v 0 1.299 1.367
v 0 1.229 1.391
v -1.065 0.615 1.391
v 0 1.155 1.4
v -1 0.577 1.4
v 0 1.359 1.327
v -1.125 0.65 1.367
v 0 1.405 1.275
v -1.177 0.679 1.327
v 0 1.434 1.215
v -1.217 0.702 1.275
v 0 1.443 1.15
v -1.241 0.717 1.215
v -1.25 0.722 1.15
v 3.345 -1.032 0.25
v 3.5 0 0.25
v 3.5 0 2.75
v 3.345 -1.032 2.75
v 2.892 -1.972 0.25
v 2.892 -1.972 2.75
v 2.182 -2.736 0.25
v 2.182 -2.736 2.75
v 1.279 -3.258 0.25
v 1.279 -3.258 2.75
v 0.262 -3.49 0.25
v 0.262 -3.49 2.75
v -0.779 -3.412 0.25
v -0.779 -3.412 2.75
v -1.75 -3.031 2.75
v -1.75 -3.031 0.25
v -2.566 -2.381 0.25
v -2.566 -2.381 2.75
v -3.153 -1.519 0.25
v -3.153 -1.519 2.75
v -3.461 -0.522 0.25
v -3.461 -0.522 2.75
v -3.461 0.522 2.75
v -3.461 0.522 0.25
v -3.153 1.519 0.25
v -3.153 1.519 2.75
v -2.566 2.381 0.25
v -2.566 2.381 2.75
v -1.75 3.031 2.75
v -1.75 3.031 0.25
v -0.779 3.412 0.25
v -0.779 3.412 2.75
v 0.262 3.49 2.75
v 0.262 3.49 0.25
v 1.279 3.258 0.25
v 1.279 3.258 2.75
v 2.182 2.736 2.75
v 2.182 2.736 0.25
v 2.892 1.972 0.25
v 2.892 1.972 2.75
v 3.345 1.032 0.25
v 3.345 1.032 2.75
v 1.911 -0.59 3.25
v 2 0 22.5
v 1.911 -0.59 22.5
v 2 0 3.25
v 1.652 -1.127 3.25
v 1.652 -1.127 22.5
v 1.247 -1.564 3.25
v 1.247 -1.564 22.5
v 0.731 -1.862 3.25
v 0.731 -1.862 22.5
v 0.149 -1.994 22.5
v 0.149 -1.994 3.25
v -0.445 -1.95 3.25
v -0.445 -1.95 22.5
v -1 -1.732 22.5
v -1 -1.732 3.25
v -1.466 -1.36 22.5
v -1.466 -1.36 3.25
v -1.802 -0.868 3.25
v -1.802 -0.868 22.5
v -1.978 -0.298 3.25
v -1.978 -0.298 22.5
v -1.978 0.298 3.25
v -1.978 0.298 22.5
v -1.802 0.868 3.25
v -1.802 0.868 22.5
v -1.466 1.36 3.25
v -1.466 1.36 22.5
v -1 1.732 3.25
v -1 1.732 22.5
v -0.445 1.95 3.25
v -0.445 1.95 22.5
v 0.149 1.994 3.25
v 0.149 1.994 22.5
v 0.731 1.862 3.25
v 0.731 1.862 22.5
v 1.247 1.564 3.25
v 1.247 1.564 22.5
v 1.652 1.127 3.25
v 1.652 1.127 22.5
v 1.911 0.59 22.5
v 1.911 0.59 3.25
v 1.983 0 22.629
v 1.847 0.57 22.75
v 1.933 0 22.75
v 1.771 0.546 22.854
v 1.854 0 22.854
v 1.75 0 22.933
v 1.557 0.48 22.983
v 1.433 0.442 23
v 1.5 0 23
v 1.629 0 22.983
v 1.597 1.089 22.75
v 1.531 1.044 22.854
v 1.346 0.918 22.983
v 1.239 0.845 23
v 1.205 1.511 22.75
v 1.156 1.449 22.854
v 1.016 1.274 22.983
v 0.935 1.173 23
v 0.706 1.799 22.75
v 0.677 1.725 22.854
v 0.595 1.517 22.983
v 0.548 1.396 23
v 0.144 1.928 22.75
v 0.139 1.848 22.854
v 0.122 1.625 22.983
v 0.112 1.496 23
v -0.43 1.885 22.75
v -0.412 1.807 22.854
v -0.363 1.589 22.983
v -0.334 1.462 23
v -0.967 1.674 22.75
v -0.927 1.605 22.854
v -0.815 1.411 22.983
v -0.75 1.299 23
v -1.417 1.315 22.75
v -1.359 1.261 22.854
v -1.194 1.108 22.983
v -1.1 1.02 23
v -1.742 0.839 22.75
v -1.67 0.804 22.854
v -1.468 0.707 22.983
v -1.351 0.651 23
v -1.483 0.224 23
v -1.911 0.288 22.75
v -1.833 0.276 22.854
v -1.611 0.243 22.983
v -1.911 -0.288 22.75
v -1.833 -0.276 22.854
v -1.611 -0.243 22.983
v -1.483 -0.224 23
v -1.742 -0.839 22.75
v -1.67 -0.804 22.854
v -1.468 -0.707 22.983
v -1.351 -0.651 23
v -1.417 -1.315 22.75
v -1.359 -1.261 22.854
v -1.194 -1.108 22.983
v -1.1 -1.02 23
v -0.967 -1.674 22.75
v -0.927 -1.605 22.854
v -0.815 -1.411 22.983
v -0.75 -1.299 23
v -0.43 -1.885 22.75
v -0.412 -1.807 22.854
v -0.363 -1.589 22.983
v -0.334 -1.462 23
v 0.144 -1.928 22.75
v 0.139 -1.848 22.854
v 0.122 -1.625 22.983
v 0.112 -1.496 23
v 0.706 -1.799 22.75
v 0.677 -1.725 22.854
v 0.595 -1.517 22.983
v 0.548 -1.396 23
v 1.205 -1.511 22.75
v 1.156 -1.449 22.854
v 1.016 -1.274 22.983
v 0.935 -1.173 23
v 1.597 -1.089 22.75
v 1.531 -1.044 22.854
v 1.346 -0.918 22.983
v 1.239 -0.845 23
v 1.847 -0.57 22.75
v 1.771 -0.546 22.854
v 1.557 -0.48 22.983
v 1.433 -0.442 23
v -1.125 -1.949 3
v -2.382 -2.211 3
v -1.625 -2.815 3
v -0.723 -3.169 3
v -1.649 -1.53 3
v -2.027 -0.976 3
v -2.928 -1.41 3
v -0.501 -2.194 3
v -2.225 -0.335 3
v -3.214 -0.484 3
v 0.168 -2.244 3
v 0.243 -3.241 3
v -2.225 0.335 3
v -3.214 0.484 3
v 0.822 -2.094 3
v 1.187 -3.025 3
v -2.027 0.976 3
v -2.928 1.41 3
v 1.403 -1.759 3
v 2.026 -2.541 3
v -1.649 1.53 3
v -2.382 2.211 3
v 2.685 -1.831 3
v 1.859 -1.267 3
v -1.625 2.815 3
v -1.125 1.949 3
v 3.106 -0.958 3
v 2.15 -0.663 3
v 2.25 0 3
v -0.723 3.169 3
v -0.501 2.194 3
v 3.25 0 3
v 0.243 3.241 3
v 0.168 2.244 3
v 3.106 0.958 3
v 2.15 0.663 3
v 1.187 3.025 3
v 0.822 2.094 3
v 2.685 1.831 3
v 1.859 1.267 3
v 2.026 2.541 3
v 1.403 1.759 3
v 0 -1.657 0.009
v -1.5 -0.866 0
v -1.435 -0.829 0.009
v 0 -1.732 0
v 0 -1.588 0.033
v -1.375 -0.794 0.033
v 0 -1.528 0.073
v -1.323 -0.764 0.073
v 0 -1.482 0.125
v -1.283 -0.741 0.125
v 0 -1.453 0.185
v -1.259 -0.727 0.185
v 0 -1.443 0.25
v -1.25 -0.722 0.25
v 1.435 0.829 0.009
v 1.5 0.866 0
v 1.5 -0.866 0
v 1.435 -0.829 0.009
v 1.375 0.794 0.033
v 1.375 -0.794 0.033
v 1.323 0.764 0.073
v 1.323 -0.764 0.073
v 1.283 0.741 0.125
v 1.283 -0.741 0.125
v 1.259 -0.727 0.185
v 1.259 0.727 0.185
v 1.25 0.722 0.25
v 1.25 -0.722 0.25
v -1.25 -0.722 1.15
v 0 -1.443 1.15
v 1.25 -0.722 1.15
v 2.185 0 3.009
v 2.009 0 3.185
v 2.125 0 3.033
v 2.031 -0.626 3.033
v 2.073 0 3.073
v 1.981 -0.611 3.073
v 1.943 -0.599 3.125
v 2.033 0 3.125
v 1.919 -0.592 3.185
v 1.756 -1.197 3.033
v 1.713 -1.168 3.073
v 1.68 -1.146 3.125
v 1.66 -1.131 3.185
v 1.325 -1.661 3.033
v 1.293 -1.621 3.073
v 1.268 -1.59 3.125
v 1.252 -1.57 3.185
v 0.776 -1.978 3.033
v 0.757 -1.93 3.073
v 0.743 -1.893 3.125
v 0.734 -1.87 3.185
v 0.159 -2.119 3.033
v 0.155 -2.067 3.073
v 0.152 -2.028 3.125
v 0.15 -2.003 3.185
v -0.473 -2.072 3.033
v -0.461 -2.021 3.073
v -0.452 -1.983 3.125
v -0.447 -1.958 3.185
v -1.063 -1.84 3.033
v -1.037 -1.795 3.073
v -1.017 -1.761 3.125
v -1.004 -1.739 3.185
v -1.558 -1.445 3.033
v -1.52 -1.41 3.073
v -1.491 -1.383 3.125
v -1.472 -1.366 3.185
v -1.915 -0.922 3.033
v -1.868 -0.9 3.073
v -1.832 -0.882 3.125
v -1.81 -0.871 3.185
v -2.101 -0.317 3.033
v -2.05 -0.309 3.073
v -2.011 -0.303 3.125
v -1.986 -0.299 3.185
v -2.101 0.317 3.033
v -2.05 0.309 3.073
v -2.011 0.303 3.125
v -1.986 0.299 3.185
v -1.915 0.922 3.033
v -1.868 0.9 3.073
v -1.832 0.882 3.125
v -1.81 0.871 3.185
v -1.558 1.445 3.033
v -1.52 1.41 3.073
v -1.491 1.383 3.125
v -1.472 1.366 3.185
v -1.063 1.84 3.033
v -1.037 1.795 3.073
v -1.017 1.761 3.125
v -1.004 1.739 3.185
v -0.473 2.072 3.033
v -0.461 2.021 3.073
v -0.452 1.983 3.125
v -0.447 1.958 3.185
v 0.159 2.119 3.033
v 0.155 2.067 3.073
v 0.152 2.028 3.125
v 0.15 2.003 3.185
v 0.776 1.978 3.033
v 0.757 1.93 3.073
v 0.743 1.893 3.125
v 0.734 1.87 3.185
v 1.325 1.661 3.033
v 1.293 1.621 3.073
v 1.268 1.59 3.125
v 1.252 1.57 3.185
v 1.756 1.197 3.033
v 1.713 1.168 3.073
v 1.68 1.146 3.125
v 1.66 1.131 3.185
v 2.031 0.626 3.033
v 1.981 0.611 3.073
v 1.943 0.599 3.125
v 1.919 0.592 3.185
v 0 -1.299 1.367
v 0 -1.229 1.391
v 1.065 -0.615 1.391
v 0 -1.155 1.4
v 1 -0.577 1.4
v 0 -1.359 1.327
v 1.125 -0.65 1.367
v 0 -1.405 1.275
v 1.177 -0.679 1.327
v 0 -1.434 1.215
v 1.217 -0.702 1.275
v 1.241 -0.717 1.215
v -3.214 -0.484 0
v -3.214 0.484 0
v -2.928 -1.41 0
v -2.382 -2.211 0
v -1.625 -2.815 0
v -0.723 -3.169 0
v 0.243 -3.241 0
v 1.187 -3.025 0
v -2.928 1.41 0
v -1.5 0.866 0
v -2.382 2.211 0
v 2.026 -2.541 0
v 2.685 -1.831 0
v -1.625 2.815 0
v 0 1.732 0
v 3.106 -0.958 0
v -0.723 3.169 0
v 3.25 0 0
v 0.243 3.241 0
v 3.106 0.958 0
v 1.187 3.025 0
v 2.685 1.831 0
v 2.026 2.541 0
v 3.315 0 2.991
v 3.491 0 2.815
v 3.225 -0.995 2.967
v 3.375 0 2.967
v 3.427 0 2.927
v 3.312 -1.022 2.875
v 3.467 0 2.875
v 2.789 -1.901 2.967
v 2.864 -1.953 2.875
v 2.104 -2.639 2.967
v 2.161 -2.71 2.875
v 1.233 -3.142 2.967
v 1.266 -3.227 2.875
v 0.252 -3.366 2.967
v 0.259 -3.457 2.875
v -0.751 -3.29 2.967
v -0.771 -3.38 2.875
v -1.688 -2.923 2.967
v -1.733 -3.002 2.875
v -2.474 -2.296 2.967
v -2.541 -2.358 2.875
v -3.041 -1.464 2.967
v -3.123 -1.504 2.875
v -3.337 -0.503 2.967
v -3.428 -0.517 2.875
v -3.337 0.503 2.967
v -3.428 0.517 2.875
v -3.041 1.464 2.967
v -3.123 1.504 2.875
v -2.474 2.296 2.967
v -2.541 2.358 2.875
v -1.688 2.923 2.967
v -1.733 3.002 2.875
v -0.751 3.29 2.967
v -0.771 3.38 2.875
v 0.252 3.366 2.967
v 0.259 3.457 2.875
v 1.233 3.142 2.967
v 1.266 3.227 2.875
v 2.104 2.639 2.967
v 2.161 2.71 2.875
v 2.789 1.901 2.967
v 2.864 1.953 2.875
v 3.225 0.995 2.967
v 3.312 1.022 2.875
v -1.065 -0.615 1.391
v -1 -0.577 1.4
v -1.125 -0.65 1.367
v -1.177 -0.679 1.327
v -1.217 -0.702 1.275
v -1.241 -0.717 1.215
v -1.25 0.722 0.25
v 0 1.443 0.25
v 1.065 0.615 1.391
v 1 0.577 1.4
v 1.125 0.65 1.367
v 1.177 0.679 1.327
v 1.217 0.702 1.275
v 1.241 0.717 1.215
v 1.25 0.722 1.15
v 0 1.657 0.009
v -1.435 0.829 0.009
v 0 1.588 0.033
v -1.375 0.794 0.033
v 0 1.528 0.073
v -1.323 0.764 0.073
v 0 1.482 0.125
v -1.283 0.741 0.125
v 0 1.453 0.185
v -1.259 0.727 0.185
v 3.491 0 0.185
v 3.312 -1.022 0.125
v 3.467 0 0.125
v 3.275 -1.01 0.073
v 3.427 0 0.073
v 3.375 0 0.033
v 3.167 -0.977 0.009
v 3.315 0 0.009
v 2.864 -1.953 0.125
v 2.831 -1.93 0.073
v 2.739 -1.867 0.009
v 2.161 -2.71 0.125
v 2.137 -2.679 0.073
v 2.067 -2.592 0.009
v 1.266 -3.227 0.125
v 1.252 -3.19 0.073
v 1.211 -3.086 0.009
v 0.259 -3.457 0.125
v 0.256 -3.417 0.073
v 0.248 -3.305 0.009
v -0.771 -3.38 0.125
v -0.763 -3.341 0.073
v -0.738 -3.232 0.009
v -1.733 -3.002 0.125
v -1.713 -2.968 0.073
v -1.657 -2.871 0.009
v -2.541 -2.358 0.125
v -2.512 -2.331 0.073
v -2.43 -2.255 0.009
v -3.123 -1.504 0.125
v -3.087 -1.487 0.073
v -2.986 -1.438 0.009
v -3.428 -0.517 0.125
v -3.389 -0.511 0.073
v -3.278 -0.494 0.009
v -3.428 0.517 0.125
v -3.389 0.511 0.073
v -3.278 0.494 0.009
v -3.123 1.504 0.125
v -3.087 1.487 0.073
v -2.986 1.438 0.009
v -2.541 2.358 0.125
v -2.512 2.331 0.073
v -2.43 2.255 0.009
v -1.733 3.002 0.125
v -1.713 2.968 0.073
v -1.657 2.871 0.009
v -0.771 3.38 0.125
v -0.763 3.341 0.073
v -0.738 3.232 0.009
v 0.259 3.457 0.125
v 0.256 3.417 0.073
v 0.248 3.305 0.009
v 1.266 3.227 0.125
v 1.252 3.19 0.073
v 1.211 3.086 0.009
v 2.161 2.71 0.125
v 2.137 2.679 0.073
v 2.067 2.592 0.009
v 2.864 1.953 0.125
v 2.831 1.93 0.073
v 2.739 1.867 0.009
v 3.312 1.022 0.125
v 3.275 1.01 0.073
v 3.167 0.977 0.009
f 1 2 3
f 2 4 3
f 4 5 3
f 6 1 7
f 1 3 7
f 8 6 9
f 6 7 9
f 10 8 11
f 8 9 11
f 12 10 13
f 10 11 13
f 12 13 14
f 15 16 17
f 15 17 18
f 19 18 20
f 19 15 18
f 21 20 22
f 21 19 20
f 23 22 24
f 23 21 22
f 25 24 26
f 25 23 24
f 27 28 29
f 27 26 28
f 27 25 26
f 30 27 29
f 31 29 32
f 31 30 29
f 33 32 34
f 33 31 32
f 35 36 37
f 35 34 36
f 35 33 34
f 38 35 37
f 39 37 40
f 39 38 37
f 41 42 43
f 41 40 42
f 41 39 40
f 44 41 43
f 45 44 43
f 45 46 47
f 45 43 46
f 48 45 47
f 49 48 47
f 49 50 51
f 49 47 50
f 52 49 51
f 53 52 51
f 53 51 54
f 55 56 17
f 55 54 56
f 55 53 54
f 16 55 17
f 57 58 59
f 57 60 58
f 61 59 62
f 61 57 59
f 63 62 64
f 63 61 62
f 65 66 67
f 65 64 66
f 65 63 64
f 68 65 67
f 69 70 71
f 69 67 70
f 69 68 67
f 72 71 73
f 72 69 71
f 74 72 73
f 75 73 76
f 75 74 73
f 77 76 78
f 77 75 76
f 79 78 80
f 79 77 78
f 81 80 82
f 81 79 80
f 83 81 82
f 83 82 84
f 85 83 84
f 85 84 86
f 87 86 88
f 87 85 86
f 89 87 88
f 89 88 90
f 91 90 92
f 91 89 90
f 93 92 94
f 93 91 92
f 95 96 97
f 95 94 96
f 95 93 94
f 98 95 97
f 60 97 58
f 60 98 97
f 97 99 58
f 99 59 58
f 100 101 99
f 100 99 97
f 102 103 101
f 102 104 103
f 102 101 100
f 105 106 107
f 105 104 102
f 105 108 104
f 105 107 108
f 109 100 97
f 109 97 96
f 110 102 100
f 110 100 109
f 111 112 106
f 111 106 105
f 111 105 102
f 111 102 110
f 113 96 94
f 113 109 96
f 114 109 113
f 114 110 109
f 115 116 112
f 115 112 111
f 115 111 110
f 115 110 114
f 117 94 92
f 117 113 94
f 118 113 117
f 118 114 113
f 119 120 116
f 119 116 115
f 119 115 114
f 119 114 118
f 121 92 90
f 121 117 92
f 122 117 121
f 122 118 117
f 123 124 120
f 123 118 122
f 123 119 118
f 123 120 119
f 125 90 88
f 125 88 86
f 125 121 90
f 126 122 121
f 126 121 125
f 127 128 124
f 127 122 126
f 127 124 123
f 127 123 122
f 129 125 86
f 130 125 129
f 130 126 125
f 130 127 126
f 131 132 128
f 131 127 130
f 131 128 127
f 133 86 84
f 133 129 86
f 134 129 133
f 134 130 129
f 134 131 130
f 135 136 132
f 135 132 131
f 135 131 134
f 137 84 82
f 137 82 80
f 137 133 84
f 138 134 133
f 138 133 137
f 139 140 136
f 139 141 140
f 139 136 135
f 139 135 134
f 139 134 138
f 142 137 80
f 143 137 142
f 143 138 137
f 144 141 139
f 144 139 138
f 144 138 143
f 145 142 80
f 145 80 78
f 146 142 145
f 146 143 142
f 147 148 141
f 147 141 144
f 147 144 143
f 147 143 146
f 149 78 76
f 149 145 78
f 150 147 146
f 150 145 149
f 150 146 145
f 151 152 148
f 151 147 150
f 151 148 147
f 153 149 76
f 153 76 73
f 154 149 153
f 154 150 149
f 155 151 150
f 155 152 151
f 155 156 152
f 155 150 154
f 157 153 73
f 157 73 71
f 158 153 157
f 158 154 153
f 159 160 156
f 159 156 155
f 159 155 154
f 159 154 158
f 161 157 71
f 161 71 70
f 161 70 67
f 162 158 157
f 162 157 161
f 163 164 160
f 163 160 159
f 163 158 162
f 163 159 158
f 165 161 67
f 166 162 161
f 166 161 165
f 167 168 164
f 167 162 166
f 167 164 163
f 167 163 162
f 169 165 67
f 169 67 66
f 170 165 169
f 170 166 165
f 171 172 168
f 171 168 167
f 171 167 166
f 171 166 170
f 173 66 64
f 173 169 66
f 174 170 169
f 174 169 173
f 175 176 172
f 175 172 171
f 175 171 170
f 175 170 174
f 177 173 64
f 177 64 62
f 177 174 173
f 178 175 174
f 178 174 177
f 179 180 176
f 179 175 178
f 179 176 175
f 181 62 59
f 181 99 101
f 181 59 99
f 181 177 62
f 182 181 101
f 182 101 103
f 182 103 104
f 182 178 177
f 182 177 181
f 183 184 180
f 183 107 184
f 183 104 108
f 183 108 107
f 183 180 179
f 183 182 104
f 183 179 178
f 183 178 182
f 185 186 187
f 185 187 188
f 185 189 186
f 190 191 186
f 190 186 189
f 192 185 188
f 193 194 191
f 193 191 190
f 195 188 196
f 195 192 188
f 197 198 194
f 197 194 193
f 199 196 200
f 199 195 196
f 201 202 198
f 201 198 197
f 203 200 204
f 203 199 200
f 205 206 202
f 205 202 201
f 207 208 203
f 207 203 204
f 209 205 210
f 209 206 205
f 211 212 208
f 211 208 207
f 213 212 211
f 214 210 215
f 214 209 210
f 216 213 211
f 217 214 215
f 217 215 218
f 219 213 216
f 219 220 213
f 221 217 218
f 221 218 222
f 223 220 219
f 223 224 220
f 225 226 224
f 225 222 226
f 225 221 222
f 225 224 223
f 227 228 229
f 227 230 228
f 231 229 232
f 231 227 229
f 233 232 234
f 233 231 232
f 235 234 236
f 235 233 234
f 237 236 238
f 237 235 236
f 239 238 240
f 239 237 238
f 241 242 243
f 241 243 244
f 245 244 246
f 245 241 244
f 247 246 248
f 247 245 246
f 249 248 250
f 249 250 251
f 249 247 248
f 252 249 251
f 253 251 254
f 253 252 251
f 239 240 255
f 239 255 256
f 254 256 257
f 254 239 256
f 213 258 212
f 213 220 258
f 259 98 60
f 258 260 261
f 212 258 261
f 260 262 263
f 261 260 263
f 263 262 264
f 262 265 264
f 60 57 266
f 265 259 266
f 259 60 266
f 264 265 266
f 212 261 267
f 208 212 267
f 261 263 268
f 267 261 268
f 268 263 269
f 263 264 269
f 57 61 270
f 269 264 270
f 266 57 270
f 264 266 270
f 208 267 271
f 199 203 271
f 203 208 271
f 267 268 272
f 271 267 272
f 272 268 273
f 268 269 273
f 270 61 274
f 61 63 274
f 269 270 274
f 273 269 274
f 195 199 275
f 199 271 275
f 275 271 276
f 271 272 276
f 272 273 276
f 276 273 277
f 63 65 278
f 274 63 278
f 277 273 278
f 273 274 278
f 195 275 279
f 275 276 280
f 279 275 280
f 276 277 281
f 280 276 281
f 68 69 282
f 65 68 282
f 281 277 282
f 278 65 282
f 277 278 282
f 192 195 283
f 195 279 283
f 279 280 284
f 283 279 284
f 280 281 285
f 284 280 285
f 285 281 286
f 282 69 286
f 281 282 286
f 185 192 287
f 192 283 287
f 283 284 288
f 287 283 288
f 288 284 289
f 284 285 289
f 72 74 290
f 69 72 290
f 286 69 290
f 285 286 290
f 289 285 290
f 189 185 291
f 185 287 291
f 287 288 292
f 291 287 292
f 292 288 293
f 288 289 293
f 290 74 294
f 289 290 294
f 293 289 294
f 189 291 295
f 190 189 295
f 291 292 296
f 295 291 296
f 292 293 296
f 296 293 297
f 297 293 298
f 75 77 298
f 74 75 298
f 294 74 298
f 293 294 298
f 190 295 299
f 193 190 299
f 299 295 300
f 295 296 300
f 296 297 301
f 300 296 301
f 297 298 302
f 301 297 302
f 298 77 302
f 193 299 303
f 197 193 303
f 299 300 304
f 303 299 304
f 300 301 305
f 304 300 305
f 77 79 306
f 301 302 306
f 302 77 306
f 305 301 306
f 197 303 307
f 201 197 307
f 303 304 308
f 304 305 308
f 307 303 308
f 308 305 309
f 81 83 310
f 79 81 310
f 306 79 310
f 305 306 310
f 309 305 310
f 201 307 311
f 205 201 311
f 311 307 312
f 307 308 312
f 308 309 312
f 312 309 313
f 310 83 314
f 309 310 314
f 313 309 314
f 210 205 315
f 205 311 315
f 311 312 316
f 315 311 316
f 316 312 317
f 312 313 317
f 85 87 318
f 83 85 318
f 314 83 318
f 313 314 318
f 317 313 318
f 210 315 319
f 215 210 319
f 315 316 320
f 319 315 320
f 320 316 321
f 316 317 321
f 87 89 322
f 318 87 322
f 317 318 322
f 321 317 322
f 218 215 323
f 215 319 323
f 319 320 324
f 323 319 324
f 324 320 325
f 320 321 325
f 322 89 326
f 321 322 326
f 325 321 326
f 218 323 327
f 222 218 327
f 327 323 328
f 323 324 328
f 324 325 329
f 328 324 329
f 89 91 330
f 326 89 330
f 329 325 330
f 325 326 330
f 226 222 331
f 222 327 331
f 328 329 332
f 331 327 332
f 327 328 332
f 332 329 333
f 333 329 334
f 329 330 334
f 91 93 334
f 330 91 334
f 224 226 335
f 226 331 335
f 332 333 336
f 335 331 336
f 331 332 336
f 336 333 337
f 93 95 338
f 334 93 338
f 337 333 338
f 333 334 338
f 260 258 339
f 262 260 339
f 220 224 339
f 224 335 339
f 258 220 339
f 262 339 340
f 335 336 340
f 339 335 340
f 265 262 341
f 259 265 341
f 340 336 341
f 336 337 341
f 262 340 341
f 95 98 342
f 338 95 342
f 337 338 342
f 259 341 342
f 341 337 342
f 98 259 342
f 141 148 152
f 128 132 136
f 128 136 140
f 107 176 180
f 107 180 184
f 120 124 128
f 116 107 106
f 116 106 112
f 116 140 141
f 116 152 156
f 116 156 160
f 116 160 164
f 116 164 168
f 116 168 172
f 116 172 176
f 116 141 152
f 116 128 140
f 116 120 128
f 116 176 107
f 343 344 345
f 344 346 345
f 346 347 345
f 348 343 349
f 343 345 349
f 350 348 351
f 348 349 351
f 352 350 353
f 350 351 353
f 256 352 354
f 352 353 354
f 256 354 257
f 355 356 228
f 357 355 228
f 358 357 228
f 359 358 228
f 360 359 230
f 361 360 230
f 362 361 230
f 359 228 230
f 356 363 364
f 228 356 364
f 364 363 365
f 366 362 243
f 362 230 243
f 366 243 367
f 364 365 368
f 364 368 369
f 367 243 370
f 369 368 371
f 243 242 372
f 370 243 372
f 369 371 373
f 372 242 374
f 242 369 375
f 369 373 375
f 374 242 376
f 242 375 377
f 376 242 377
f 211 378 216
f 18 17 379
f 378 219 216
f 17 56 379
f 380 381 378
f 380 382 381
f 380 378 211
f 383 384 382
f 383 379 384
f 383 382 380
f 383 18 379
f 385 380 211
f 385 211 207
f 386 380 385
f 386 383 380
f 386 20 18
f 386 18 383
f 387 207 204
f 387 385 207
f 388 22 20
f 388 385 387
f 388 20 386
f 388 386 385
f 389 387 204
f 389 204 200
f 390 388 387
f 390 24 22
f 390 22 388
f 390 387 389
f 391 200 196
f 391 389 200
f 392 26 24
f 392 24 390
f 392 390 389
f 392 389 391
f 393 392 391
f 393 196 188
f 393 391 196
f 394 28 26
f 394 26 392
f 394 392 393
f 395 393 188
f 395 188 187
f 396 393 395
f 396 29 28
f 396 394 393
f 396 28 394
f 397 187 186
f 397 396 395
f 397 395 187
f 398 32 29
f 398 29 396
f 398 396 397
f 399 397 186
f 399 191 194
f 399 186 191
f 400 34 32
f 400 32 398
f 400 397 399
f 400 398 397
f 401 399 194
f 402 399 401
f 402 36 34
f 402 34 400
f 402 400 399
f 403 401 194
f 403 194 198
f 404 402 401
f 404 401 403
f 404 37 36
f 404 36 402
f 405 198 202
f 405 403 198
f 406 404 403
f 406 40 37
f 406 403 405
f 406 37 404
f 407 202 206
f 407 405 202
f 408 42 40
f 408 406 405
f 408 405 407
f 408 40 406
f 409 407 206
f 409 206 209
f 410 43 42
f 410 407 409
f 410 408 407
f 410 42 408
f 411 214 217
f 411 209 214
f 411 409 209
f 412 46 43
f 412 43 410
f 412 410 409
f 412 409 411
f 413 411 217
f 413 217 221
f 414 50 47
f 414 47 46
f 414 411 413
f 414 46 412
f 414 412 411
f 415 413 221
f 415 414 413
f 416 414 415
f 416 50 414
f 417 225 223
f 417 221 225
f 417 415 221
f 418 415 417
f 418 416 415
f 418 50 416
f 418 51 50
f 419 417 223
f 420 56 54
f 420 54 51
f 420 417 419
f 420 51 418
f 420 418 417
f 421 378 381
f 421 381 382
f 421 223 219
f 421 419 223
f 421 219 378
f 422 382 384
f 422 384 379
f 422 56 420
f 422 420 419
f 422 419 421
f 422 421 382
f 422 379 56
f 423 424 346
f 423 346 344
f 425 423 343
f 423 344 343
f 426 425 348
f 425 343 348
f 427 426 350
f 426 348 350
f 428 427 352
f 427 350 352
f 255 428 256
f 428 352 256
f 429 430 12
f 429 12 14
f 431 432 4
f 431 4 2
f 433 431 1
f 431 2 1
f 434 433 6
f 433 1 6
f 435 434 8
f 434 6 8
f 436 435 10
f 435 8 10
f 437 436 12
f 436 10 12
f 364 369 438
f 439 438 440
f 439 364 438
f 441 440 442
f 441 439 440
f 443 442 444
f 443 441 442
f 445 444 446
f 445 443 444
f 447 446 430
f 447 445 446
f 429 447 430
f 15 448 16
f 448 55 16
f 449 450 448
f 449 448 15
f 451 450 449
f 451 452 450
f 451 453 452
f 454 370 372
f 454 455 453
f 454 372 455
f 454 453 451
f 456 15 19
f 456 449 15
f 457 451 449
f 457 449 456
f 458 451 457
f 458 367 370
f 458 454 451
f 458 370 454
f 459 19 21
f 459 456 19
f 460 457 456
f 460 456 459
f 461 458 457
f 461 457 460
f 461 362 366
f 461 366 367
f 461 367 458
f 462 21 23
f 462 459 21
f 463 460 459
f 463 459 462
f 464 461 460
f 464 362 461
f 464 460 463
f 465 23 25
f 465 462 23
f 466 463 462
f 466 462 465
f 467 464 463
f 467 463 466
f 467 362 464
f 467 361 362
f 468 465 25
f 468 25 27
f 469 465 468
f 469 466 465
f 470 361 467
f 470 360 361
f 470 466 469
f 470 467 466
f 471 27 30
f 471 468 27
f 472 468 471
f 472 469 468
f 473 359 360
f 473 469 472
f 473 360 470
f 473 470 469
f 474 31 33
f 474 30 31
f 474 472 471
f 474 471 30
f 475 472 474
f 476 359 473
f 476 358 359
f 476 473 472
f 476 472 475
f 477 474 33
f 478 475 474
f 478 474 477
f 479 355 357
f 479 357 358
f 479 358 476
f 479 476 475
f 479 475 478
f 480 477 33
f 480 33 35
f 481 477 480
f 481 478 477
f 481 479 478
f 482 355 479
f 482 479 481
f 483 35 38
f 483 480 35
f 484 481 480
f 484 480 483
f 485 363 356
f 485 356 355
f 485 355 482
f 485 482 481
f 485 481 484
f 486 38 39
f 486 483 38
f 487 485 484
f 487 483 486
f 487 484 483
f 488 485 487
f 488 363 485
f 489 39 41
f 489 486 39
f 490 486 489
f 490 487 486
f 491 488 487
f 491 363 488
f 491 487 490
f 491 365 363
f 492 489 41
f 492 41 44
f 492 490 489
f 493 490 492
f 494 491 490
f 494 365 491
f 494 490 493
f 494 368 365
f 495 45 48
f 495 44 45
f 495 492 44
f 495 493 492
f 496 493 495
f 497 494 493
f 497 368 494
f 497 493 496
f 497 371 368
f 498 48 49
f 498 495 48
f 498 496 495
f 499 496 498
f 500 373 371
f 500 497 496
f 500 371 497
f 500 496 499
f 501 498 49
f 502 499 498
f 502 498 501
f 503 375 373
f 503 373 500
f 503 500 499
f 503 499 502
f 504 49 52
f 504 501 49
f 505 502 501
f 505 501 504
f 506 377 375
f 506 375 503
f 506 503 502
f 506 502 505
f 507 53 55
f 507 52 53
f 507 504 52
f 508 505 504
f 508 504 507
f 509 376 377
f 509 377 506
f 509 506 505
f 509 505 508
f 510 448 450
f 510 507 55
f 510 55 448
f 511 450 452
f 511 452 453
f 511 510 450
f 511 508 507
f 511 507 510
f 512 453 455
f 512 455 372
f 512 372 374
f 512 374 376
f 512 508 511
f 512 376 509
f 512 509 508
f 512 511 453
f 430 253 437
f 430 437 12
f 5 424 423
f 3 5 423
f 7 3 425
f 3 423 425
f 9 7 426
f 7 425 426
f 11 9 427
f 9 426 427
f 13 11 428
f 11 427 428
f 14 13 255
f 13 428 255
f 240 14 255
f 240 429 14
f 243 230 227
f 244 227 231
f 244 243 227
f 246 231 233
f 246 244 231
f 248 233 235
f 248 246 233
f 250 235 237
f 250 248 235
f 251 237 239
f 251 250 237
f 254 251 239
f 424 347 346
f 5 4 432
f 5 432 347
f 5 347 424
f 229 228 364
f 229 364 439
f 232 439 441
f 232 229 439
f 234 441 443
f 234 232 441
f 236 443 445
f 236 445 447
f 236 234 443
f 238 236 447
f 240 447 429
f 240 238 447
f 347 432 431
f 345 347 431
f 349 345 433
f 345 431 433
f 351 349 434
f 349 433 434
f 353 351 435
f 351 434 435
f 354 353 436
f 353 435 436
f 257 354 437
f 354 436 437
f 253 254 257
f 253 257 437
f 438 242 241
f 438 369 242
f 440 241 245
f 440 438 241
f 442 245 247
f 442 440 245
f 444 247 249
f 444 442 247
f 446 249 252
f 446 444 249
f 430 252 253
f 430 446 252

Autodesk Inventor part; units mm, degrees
ref_plane "YZ Plane" through (0, 0, 0) normal (1, 0, 0) x (0, 1, 0)
ref_plane "XZ Plane" through (0, 0, 0) normal (0, 1, 0) x (-1, 0, 0)
ref_plane "XY Plane" through (0, 0, 0) normal (0, 0, 1) x (1, 0, 0)
sketch "Esquisse1" plane through (0, 0, 0) normal (0, 0, 1) x (1, 0, 0)
  circle A0 centre (0, 0) radius 3.5
  dimension "d0" = 7
extrude "Extrusion1" add sketch "Esquisse1" along normal blind 3
sketch "Esquisse2" plane through (0, 0, 3) normal (0, 0, 1) x (1, 0, 0)
  circle A0 centre (0, 0) radius 3.5 projected
  circle A1 centre (0, 0) radius 2
  dimension "d3" = 4
extrude "Extrusion2" add sketch "Esquisse2" along normal blind 20 contours A1
fillet "Congé1" radius 0.5 1 edges at (-2, 0, 23)
thread "Filetage1" size "M4x0.7" class "6g" standard "ANSI Metric M Profile" full length
fillet "Congé2" radius 0.25 2 edges at (-3.5, 0, 0) (-3.5, 0, 3)
sketch "Esquisse3" plane through (0, 0, 0) normal (0, 0, -1) x (-1, 0, 0)
  circle A0 centre (0, 0) radius 3.25 projected
  line L0 (0, 1.4434) -> (1.25, 0.7217)
  line L1 (1.25, 0.7217) -> (1.25, -0.7217)
  line L2 (1.25, -0.7217) -> (0, -1.4434)
  line L3 (0, -1.4434) -> (-1.25, -0.7217)
  line L4 (-1.25, -0.7217) -> (-1.25, 0.7217)
  line L5 (-1.25, 0.7217) -> (0, 1.4434)
  dimension "d10" = 2.5
extrude "Extrusion3" cut sketch "Esquisse3" against normal blind 1.4 contours L0 L1 L2 L3 L4 L5
fillet "Congé3" radius 0.25 12 edges at (-0.625, 1.0825, 0) (-1.25, 0, 0) (-0.625, -1.0825, 0) (0.625, -1.0825, 0) (1.25, 0, 0) (0.625, 1.0825, 0) (-0.625, 1.0825, 1.4) (0.625, 1.0825, 1.4) (1.25, 0, 1.4) (0.625, -1.0825, 1.4) (-0.625, -1.0825, 1.4) (-1.25, 0, 1.4)
fillet "Congé4" radius 0.25 1 edges at (-2, 0, 3)
properties part number "Vis-Pivot" material "Acier"
